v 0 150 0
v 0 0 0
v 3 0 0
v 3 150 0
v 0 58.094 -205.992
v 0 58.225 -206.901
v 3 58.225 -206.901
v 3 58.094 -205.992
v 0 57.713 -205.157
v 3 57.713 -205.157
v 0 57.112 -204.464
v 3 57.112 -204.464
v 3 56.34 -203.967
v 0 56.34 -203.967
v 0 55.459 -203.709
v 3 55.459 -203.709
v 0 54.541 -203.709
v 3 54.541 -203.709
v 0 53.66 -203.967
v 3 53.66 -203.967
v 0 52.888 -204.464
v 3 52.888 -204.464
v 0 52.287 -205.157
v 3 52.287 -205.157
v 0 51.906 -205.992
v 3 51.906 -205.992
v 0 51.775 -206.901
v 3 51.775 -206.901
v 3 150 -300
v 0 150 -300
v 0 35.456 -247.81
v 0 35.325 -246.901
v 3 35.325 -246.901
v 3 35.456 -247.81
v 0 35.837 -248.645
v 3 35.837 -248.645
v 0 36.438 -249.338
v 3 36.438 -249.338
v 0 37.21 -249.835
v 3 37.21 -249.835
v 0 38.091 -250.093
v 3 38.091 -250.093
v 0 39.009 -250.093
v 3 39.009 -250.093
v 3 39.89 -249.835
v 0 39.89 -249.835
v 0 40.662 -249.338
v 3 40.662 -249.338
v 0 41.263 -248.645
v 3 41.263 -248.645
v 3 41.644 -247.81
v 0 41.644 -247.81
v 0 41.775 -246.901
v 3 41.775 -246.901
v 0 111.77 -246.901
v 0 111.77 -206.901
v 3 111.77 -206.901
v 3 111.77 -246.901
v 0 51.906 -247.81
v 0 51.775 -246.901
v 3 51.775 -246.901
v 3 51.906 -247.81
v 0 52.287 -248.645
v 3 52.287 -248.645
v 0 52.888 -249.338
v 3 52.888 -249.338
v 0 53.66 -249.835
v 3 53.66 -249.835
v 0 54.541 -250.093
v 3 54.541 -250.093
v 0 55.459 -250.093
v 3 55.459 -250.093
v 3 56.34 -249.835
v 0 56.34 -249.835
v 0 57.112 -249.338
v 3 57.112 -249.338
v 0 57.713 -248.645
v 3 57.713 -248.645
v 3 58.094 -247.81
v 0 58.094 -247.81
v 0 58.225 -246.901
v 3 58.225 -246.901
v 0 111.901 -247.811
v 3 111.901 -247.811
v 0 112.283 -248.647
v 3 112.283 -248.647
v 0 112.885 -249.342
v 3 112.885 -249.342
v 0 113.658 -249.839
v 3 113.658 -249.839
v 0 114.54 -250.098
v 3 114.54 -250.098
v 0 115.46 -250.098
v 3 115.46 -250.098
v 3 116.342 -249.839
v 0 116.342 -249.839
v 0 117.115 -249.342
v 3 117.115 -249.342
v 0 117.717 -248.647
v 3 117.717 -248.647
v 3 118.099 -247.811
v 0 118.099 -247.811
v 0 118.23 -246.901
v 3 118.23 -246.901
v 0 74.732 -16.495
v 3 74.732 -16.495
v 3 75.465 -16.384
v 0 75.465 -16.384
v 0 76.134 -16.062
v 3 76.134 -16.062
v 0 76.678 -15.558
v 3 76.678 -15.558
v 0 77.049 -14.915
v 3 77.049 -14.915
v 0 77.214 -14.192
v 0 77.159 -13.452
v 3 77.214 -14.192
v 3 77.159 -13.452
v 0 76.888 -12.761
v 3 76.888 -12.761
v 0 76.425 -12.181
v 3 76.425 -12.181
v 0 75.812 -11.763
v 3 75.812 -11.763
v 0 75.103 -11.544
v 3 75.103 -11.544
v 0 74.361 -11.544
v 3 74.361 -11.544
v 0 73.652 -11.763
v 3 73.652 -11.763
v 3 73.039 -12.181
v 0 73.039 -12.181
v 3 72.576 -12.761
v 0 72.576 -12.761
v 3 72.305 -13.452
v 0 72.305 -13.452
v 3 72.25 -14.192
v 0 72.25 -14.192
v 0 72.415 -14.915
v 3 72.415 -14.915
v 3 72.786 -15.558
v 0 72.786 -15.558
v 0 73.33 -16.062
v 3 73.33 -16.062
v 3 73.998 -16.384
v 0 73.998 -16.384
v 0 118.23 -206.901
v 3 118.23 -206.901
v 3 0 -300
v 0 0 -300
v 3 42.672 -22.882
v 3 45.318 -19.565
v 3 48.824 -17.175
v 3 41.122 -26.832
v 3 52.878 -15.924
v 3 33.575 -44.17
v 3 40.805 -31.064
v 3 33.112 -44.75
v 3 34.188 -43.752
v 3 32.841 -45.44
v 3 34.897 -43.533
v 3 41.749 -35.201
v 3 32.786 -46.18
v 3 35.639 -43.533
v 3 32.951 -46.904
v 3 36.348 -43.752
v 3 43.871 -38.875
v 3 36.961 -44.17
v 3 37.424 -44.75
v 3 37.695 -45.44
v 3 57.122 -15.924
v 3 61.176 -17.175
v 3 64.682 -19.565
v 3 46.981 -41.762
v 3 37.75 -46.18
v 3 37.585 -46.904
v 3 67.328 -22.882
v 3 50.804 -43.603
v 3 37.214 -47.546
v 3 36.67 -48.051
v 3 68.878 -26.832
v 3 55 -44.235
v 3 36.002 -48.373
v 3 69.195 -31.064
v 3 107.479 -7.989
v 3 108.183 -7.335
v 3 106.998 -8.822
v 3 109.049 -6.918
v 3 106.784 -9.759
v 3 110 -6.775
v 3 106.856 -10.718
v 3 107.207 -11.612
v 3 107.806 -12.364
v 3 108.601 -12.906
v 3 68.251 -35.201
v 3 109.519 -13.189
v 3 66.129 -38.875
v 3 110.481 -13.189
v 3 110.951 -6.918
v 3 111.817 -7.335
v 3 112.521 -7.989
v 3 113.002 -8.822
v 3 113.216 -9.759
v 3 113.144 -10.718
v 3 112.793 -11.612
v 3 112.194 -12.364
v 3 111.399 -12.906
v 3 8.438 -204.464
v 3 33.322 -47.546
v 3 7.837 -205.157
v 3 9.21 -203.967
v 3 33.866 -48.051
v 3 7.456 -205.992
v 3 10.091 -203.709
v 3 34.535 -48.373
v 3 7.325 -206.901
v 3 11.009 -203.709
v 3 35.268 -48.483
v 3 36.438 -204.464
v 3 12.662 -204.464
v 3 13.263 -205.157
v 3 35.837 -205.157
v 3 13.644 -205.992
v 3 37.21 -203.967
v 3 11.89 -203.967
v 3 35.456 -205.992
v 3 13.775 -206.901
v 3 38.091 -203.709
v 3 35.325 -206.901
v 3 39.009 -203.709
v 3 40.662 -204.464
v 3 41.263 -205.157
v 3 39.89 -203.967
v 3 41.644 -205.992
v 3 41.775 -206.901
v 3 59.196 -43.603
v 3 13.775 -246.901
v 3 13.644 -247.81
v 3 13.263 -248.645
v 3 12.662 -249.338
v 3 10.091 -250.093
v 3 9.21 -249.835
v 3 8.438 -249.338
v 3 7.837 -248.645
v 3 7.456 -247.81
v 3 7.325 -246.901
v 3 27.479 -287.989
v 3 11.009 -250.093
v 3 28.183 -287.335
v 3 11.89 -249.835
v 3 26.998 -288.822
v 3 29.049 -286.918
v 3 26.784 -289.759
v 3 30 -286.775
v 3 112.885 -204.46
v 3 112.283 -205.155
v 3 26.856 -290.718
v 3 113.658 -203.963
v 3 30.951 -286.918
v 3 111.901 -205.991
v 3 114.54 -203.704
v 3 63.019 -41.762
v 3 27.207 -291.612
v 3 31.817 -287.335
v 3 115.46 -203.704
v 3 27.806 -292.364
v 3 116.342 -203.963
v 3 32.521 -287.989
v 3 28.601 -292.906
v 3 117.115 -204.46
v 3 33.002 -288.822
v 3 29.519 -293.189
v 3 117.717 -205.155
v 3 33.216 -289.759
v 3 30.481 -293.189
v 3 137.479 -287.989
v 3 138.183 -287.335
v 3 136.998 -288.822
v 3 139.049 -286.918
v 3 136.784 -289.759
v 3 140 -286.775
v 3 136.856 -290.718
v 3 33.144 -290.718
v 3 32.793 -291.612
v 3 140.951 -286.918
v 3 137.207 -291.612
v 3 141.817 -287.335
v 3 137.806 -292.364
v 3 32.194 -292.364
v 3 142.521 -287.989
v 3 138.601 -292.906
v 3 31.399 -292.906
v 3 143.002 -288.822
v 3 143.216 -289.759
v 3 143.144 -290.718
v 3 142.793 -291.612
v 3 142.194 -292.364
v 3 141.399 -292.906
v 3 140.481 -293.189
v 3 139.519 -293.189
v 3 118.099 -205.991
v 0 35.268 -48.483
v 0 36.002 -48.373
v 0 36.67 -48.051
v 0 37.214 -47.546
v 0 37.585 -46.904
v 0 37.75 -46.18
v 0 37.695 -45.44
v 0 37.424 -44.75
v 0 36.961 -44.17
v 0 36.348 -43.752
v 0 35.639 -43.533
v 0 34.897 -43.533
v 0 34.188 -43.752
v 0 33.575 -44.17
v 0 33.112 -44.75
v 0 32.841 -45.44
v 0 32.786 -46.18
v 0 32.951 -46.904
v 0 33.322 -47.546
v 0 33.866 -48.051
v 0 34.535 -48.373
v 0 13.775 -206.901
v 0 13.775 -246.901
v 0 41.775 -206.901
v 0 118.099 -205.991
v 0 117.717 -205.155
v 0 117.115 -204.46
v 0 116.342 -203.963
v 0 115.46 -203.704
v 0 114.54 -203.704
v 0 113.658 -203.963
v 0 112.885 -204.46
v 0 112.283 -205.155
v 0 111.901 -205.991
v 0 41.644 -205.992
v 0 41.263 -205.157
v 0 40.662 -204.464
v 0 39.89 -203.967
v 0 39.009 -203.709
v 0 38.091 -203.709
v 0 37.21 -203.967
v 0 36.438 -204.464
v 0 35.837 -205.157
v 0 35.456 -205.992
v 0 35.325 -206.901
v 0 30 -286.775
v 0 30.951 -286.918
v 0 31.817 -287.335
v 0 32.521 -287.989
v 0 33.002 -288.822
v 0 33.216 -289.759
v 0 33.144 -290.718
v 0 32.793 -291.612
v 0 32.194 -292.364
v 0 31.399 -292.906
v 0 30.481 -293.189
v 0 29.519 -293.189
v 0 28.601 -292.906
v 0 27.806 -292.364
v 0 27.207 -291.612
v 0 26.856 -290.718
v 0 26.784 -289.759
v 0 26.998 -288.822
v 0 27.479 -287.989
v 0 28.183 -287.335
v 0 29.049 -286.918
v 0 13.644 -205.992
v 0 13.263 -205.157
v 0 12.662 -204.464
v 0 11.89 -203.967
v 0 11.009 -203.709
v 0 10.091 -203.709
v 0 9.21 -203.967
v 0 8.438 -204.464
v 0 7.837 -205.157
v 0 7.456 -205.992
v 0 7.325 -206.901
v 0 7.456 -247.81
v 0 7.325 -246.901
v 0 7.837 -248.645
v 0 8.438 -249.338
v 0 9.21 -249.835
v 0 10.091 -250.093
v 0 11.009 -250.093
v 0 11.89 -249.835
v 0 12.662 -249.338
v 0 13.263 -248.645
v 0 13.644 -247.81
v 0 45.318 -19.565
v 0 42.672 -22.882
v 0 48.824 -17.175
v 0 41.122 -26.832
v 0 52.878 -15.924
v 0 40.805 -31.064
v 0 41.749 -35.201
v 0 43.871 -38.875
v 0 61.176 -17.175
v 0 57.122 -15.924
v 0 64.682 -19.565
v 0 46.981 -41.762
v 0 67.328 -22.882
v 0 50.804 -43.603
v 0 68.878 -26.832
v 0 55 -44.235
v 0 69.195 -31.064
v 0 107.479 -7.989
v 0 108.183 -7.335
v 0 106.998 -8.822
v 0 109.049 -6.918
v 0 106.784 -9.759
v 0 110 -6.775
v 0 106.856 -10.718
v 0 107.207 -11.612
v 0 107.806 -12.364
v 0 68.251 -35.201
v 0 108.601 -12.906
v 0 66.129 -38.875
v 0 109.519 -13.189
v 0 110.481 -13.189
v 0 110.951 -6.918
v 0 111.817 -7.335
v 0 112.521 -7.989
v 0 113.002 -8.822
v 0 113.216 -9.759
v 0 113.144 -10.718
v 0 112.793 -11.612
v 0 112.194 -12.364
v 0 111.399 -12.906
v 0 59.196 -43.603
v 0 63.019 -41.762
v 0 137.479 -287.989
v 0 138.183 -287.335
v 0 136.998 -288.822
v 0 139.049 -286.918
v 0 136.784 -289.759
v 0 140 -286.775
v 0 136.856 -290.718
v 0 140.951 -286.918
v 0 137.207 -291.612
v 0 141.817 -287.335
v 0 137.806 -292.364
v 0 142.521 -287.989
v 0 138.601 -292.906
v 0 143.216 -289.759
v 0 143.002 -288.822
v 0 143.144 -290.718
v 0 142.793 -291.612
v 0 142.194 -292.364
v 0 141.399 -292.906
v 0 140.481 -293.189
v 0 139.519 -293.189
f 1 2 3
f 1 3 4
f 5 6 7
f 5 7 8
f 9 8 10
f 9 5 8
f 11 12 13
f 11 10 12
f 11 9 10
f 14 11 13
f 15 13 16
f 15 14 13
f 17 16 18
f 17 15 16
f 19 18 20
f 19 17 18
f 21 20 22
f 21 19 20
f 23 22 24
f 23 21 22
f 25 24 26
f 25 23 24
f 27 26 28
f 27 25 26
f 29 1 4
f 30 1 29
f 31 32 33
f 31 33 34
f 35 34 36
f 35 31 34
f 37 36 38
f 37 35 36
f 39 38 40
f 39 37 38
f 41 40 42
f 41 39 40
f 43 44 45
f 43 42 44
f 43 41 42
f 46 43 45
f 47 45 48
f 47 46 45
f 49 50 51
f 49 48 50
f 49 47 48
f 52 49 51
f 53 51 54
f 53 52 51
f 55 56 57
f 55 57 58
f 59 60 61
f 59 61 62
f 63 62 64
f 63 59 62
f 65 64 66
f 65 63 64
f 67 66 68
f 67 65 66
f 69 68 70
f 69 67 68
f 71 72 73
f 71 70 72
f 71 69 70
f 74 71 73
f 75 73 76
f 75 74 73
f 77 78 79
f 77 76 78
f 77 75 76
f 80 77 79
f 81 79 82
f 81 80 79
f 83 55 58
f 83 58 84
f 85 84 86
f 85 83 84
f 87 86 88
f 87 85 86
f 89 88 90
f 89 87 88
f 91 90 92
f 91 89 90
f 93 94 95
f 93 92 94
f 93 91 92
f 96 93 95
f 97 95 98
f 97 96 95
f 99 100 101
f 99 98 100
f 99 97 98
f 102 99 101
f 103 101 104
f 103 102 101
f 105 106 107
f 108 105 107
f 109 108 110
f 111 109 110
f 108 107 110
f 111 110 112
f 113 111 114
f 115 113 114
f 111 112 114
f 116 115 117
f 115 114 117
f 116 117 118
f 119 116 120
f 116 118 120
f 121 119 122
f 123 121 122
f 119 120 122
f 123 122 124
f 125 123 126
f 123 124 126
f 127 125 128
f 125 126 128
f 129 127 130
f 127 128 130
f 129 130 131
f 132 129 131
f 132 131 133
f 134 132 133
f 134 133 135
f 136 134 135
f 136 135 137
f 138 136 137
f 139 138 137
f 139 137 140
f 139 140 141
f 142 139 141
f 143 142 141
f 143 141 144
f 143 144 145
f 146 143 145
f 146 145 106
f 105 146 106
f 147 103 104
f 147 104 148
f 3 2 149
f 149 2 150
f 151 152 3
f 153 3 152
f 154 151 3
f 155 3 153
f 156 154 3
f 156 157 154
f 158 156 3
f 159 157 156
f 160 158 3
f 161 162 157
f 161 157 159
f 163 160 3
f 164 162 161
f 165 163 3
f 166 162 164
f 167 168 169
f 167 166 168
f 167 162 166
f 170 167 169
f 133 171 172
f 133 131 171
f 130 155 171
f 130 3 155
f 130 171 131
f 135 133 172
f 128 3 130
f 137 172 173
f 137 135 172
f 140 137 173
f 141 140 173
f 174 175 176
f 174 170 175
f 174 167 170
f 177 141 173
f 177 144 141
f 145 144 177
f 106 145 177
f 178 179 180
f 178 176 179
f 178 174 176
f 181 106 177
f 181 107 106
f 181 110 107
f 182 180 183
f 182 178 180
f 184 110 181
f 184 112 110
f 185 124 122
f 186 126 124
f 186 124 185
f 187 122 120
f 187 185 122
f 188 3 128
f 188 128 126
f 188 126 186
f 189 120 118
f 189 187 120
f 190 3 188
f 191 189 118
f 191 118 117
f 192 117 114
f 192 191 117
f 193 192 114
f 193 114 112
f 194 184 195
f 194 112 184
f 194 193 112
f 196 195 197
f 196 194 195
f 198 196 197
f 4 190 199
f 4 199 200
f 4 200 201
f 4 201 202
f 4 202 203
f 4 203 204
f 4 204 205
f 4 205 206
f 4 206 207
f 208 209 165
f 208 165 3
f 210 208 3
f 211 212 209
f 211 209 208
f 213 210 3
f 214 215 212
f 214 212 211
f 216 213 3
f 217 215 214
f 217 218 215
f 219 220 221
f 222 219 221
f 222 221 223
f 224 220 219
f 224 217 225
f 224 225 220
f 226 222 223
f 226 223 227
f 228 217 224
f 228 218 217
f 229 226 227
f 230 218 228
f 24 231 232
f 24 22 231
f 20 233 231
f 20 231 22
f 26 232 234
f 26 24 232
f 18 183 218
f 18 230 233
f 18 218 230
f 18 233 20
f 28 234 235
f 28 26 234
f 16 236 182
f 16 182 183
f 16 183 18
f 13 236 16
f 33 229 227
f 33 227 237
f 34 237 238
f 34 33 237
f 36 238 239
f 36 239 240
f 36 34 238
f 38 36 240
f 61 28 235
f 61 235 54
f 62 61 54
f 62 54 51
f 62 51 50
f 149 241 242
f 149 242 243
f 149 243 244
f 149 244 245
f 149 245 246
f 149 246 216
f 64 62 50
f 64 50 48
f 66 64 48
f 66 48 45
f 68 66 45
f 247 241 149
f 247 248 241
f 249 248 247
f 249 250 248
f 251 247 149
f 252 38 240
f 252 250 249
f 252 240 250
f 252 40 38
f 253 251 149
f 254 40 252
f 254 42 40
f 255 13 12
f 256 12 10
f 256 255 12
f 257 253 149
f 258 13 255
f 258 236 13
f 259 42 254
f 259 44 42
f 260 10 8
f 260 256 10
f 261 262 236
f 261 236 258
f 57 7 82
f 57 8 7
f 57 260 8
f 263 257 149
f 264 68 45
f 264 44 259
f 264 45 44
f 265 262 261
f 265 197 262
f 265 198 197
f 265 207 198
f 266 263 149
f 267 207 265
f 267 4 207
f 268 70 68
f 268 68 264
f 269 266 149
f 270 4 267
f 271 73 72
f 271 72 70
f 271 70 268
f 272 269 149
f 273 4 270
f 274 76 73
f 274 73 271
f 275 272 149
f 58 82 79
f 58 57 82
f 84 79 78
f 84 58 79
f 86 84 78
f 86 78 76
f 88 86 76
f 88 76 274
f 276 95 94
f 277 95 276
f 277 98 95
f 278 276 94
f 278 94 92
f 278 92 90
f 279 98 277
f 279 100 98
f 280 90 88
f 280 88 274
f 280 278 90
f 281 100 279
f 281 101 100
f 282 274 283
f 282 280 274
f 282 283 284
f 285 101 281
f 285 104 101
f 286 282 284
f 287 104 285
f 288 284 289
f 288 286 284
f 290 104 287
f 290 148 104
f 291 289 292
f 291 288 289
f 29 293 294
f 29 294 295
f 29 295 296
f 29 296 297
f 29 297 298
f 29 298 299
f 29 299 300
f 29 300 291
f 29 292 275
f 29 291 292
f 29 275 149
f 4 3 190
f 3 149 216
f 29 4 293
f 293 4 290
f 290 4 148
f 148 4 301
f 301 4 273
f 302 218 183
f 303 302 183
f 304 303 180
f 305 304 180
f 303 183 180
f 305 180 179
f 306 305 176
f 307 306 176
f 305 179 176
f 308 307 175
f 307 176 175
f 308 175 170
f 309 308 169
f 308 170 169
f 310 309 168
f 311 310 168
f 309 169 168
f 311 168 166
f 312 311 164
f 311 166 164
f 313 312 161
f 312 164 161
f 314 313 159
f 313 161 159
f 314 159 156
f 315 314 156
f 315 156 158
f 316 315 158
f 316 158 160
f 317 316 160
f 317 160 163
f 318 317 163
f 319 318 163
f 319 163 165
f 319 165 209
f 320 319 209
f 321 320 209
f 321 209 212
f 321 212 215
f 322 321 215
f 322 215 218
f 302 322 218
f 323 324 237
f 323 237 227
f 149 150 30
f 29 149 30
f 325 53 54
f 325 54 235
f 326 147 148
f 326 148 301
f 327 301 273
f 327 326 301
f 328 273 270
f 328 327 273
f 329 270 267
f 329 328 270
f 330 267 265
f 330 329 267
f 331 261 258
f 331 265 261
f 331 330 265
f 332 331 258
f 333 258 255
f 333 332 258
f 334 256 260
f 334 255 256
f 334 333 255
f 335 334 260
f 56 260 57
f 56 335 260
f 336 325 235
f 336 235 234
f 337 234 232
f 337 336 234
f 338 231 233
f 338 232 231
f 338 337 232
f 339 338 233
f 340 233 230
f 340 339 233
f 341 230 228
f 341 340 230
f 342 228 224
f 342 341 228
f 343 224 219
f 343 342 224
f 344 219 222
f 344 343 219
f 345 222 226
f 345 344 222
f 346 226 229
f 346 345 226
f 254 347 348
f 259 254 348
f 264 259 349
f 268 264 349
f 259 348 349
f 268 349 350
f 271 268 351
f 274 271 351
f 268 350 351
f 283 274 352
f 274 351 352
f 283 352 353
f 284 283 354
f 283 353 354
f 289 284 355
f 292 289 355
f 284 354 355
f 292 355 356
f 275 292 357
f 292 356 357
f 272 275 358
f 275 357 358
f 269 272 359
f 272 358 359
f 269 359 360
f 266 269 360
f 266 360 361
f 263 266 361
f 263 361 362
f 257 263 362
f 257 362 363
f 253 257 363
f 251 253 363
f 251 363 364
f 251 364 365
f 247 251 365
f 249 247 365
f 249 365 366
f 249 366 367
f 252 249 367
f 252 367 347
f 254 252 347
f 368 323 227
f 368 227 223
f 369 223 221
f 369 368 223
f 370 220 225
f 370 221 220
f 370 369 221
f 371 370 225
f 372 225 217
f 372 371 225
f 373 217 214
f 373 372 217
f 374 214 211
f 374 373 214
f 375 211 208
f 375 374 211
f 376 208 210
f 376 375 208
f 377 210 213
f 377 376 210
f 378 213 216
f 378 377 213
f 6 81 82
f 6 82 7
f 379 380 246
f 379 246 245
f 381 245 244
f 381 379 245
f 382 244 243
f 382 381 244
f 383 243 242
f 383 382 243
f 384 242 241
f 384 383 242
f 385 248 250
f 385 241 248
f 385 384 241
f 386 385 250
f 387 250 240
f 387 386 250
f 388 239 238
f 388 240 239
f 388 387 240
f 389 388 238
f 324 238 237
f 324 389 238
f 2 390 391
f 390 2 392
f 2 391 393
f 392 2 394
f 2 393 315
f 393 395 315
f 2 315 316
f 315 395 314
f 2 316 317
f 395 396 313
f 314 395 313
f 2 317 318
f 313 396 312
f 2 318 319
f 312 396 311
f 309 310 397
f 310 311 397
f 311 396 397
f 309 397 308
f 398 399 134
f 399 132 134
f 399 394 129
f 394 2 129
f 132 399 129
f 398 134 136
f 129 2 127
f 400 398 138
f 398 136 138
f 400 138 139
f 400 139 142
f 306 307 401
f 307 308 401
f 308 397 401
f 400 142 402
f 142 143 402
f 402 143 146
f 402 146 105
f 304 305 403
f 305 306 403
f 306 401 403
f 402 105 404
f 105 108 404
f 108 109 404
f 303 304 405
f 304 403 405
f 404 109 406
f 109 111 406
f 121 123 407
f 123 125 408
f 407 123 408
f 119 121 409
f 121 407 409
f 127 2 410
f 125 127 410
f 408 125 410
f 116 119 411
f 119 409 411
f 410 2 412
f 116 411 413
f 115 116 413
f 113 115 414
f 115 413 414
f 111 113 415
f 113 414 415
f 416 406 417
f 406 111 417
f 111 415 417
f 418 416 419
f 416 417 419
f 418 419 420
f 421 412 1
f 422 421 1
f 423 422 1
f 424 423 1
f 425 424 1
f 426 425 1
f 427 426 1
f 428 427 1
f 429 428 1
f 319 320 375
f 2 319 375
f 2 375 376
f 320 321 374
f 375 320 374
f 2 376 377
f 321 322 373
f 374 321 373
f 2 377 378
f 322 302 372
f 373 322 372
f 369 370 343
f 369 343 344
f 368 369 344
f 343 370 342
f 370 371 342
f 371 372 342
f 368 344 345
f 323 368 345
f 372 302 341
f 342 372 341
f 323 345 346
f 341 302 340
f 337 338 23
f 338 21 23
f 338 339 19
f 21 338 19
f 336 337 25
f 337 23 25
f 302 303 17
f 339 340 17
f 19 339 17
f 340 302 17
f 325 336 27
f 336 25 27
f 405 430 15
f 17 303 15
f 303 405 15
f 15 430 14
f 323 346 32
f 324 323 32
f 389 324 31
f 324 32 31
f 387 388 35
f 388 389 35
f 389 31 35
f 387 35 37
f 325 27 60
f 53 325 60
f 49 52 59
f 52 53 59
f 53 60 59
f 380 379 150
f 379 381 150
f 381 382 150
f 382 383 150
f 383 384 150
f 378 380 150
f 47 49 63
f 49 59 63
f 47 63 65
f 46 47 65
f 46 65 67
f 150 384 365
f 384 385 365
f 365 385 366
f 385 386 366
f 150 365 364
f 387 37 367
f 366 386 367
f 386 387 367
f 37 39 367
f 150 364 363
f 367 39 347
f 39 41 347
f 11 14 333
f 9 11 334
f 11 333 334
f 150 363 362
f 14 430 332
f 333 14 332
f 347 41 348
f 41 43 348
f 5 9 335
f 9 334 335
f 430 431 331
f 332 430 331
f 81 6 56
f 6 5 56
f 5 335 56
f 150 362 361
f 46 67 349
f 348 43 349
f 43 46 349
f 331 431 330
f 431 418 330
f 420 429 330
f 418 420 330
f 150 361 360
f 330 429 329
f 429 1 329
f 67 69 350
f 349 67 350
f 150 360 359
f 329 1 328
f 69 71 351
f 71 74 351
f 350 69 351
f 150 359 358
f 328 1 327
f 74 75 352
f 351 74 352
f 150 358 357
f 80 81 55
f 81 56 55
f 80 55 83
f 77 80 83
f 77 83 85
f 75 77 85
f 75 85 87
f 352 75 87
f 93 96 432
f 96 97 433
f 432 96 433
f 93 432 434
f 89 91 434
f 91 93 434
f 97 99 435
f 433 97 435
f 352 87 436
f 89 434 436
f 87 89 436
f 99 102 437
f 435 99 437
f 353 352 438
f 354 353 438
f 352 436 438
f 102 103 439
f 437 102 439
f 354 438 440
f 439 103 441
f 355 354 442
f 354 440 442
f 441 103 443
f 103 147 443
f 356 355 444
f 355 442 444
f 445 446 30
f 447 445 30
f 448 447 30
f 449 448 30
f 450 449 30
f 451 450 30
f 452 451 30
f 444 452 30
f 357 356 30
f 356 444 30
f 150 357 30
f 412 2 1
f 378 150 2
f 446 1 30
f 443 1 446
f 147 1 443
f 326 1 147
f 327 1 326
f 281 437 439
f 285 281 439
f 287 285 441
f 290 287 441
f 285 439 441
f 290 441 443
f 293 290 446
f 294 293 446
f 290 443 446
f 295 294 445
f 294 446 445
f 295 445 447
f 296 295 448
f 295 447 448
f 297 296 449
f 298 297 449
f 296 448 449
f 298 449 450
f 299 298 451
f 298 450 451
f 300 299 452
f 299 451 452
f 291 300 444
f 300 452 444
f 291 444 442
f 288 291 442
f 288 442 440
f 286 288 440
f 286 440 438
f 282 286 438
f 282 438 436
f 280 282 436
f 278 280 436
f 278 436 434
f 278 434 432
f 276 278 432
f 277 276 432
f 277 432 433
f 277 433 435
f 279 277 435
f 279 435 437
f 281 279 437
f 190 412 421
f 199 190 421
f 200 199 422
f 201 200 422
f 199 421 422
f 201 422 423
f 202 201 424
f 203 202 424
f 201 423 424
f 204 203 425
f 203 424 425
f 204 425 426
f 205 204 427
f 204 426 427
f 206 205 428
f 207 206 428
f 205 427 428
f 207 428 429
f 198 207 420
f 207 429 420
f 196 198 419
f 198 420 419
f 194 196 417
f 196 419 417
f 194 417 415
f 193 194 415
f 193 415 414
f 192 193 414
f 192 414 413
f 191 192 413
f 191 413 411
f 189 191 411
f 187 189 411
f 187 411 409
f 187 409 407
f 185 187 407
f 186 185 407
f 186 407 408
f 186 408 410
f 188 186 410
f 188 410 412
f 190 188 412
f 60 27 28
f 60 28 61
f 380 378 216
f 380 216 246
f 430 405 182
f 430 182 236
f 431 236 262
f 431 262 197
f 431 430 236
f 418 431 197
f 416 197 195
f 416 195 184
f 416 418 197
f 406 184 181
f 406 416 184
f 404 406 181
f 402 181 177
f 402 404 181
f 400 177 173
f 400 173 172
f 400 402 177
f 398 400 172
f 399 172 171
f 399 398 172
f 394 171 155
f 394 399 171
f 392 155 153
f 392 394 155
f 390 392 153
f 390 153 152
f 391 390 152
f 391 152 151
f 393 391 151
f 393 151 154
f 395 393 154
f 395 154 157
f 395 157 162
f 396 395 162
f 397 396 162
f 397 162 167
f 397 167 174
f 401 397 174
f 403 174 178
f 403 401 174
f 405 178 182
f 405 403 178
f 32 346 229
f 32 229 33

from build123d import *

# Parameters (mm, degrees)
SKETCH1_W           = 300
SKETCH1_H           = 150
SKETCH1_R           = 14.235
BOSS_EXTRUDE1_DEPTH = 3
CUT_EXTRUDE1_REACH  = 5
SKETCH2_R           = 3.225
SKETCH3_R           = 2.4892
CUT_EXTRUDE2_DEPTH  = 4


with BuildPart() as part:
    # Sketch1 → Boss-Extrude1 (new body)
    with BuildSketch(Plane(origin=(0, 0, 0), x_dir=(0, 0, -1), z_dir=(1, 0, 0))):
        with Locations((150, 75)):
            Rectangle(SKETCH1_W, SKETCH1_H)
        with Locations((30, 55)):
            Circle(SKETCH1_R, mode=Mode.SUBTRACT)
    extrude(amount=BOSS_EXTRUDE1_DEPTH)

    # Sketch2 → Cut-Extrude1 (cut, up to next)
    with BuildSketch(Plane.ZY, mode=Mode.PRIVATE) as cut_extrude1_sk1:
        with Locations((-290, 140)):
            Circle(SKETCH2_R)
    cut_extrude1_tool1 = extrude(cut_extrude1_sk1.sketch, amount=-CUT_EXTRUDE1_REACH, mode=Mode.PRIVATE) & part.part
    add(cut_extrude1_tool1.solids().sort_by_distance((0, 140, -290))[0], mode=Mode.SUBTRACT)
    # Sketch2 → Cut-Extrude1 (cut, up to next)
    with BuildSketch(Plane.ZY, mode=Mode.PRIVATE) as cut_extrude1_sk2:
        with Locations((-10, 110)):
            Circle(SKETCH2_R)
    cut_extrude1_tool2 = extrude(cut_extrude1_sk2.sketch, amount=-CUT_EXTRUDE1_REACH, mode=Mode.PRIVATE) & part.part
    add(cut_extrude1_tool2.solids().sort_by_distance((0, 110, -10))[0], mode=Mode.SUBTRACT)
    # Sketch2 → Cut-Extrude1 (cut, up to next)
    with BuildSketch(Plane.ZY, mode=Mode.PRIVATE) as cut_extrude1_sk3:
        with Locations((-290, 30)):
            Circle(SKETCH2_R)
    cut_extrude1_tool3 = extrude(cut_extrude1_sk3.sketch, amount=-CUT_EXTRUDE1_REACH, mode=Mode.PRIVATE) & part.part
    add(cut_extrude1_tool3.solids().sort_by_distance((0, 30, -290))[0], mode=Mode.SUBTRACT)
    # Sketch2 → Cut-Extrude1 (cut, up to next)
    with BuildSketch(Plane.ZY, mode=Mode.PRIVATE) as cut_extrude1_sk4:
        with BuildLine():
            Line((-246.901029004, 58.225), (-206.901029004, 58.225))
            ThreePointArc((-206.901029004, 58.225), (-203.676029004, 55), (-206.901029004, 51.775))
            Line((-206.901029004, 51.775), (-246.901029004, 51.775))
            ThreePointArc((-246.901029004, 51.775), (-250.126029004, 55), (-246.901029004, 58.225))
        make_face()
    cut_extrude1_tool4 = extrude(cut_extrude1_sk4.sketch, amount=-CUT_EXTRUDE1_REACH, mode=Mode.PRIVATE) & part.part
    add(cut_extrude1_tool4.solids().sort_by_distance((0, 55, -226.901029))[0], mode=Mode.SUBTRACT)
    # Sketch2 → Cut-Extrude1 (cut, up to next)
    with BuildSketch(Plane.ZY, mode=Mode.PRIVATE) as cut_extrude1_sk5:
        with BuildLine():
            Line((-206.901029004, 111.77), (-246.901029004, 111.77))
            ThreePointArc((-246.901029004, 111.77), (-250.131029004, 115), (-246.901029004, 118.23))
            Line((-246.901029004, 118.23), (-206.901029004, 118.23))
            ThreePointArc((-206.901029004, 118.23), (-203.671029004, 115), (-206.901029004, 111.77))
        make_face()
    cut_extrude1_tool5 = extrude(cut_extrude1_sk5.sketch, amount=-CUT_EXTRUDE1_REACH, mode=Mode.PRIVATE) & part.part
    add(cut_extrude1_tool5.solids().sort_by_distance((0, 115, -226.901029))[0], mode=Mode.SUBTRACT)
    # Sketch2 → Cut-Extrude1 (cut, up to next)
    with BuildSketch(Plane.ZY, mode=Mode.PRIVATE) as cut_extrude1_sk6:
        with BuildLine():
            Line((-246.901029004, 41.775), (-206.901029004, 41.775))
            ThreePointArc((-206.901029004, 41.775), (-203.676029004, 38.55), (-206.901029004, 35.325))
            Line((-206.901029004, 35.325), (-246.901029004, 35.325))
            ThreePointArc((-246.901029004, 35.325), (-250.126029004, 38.55), (-246.901029004, 41.775))
        make_face()
    cut_extrude1_tool6 = extrude(cut_extrude1_sk6.sketch, amount=-CUT_EXTRUDE1_REACH, mode=Mode.PRIVATE) & part.part
    add(cut_extrude1_tool6.solids().sort_by_distance((0, 38.55, -226.901029))[0], mode=Mode.SUBTRACT)
    # Sketch2 → Cut-Extrude1 (cut, up to next)
    with BuildSketch(Plane.ZY, mode=Mode.PRIVATE) as cut_extrude1_sk7:
        with BuildLine():
            Line((-246.901029004, 13.775), (-206.901029004, 13.775))
            ThreePointArc((-206.901029004, 13.775), (-203.676029004, 10.55), (-206.901029004, 7.325))
            Line((-206.901029004, 7.325), (-246.901029004, 7.325))
            ThreePointArc((-246.901029004, 7.325), (-250.126029004, 10.55), (-246.901029004, 13.775))
        make_face()
    cut_extrude1_tool7 = extrude(cut_extrude1_sk7.sketch, amount=-CUT_EXTRUDE1_REACH, mode=Mode.PRIVATE) & part.part
    add(cut_extrude1_tool7.solids().sort_by_distance((0, 10.55, -226.901029))[0], mode=Mode.SUBTRACT)

    # Sketch3 → Cut-Extrude2 (cut, through all)
    with BuildSketch(Plane(origin=(3, 0, 0), x_dir=(0, 0, -1), z_dir=(1, 0, 0))):
        with Locations((14.005743185, 74.73179538)):
            Circle(SKETCH3_R)
        with Locations((45.994256815, 35.26820462)):
            Circle(SKETCH3_R)
    extrude(amount=-CUT_EXTRUDE2_DEPTH, mode=Mode.SUBTRACT)


solid = part.part
